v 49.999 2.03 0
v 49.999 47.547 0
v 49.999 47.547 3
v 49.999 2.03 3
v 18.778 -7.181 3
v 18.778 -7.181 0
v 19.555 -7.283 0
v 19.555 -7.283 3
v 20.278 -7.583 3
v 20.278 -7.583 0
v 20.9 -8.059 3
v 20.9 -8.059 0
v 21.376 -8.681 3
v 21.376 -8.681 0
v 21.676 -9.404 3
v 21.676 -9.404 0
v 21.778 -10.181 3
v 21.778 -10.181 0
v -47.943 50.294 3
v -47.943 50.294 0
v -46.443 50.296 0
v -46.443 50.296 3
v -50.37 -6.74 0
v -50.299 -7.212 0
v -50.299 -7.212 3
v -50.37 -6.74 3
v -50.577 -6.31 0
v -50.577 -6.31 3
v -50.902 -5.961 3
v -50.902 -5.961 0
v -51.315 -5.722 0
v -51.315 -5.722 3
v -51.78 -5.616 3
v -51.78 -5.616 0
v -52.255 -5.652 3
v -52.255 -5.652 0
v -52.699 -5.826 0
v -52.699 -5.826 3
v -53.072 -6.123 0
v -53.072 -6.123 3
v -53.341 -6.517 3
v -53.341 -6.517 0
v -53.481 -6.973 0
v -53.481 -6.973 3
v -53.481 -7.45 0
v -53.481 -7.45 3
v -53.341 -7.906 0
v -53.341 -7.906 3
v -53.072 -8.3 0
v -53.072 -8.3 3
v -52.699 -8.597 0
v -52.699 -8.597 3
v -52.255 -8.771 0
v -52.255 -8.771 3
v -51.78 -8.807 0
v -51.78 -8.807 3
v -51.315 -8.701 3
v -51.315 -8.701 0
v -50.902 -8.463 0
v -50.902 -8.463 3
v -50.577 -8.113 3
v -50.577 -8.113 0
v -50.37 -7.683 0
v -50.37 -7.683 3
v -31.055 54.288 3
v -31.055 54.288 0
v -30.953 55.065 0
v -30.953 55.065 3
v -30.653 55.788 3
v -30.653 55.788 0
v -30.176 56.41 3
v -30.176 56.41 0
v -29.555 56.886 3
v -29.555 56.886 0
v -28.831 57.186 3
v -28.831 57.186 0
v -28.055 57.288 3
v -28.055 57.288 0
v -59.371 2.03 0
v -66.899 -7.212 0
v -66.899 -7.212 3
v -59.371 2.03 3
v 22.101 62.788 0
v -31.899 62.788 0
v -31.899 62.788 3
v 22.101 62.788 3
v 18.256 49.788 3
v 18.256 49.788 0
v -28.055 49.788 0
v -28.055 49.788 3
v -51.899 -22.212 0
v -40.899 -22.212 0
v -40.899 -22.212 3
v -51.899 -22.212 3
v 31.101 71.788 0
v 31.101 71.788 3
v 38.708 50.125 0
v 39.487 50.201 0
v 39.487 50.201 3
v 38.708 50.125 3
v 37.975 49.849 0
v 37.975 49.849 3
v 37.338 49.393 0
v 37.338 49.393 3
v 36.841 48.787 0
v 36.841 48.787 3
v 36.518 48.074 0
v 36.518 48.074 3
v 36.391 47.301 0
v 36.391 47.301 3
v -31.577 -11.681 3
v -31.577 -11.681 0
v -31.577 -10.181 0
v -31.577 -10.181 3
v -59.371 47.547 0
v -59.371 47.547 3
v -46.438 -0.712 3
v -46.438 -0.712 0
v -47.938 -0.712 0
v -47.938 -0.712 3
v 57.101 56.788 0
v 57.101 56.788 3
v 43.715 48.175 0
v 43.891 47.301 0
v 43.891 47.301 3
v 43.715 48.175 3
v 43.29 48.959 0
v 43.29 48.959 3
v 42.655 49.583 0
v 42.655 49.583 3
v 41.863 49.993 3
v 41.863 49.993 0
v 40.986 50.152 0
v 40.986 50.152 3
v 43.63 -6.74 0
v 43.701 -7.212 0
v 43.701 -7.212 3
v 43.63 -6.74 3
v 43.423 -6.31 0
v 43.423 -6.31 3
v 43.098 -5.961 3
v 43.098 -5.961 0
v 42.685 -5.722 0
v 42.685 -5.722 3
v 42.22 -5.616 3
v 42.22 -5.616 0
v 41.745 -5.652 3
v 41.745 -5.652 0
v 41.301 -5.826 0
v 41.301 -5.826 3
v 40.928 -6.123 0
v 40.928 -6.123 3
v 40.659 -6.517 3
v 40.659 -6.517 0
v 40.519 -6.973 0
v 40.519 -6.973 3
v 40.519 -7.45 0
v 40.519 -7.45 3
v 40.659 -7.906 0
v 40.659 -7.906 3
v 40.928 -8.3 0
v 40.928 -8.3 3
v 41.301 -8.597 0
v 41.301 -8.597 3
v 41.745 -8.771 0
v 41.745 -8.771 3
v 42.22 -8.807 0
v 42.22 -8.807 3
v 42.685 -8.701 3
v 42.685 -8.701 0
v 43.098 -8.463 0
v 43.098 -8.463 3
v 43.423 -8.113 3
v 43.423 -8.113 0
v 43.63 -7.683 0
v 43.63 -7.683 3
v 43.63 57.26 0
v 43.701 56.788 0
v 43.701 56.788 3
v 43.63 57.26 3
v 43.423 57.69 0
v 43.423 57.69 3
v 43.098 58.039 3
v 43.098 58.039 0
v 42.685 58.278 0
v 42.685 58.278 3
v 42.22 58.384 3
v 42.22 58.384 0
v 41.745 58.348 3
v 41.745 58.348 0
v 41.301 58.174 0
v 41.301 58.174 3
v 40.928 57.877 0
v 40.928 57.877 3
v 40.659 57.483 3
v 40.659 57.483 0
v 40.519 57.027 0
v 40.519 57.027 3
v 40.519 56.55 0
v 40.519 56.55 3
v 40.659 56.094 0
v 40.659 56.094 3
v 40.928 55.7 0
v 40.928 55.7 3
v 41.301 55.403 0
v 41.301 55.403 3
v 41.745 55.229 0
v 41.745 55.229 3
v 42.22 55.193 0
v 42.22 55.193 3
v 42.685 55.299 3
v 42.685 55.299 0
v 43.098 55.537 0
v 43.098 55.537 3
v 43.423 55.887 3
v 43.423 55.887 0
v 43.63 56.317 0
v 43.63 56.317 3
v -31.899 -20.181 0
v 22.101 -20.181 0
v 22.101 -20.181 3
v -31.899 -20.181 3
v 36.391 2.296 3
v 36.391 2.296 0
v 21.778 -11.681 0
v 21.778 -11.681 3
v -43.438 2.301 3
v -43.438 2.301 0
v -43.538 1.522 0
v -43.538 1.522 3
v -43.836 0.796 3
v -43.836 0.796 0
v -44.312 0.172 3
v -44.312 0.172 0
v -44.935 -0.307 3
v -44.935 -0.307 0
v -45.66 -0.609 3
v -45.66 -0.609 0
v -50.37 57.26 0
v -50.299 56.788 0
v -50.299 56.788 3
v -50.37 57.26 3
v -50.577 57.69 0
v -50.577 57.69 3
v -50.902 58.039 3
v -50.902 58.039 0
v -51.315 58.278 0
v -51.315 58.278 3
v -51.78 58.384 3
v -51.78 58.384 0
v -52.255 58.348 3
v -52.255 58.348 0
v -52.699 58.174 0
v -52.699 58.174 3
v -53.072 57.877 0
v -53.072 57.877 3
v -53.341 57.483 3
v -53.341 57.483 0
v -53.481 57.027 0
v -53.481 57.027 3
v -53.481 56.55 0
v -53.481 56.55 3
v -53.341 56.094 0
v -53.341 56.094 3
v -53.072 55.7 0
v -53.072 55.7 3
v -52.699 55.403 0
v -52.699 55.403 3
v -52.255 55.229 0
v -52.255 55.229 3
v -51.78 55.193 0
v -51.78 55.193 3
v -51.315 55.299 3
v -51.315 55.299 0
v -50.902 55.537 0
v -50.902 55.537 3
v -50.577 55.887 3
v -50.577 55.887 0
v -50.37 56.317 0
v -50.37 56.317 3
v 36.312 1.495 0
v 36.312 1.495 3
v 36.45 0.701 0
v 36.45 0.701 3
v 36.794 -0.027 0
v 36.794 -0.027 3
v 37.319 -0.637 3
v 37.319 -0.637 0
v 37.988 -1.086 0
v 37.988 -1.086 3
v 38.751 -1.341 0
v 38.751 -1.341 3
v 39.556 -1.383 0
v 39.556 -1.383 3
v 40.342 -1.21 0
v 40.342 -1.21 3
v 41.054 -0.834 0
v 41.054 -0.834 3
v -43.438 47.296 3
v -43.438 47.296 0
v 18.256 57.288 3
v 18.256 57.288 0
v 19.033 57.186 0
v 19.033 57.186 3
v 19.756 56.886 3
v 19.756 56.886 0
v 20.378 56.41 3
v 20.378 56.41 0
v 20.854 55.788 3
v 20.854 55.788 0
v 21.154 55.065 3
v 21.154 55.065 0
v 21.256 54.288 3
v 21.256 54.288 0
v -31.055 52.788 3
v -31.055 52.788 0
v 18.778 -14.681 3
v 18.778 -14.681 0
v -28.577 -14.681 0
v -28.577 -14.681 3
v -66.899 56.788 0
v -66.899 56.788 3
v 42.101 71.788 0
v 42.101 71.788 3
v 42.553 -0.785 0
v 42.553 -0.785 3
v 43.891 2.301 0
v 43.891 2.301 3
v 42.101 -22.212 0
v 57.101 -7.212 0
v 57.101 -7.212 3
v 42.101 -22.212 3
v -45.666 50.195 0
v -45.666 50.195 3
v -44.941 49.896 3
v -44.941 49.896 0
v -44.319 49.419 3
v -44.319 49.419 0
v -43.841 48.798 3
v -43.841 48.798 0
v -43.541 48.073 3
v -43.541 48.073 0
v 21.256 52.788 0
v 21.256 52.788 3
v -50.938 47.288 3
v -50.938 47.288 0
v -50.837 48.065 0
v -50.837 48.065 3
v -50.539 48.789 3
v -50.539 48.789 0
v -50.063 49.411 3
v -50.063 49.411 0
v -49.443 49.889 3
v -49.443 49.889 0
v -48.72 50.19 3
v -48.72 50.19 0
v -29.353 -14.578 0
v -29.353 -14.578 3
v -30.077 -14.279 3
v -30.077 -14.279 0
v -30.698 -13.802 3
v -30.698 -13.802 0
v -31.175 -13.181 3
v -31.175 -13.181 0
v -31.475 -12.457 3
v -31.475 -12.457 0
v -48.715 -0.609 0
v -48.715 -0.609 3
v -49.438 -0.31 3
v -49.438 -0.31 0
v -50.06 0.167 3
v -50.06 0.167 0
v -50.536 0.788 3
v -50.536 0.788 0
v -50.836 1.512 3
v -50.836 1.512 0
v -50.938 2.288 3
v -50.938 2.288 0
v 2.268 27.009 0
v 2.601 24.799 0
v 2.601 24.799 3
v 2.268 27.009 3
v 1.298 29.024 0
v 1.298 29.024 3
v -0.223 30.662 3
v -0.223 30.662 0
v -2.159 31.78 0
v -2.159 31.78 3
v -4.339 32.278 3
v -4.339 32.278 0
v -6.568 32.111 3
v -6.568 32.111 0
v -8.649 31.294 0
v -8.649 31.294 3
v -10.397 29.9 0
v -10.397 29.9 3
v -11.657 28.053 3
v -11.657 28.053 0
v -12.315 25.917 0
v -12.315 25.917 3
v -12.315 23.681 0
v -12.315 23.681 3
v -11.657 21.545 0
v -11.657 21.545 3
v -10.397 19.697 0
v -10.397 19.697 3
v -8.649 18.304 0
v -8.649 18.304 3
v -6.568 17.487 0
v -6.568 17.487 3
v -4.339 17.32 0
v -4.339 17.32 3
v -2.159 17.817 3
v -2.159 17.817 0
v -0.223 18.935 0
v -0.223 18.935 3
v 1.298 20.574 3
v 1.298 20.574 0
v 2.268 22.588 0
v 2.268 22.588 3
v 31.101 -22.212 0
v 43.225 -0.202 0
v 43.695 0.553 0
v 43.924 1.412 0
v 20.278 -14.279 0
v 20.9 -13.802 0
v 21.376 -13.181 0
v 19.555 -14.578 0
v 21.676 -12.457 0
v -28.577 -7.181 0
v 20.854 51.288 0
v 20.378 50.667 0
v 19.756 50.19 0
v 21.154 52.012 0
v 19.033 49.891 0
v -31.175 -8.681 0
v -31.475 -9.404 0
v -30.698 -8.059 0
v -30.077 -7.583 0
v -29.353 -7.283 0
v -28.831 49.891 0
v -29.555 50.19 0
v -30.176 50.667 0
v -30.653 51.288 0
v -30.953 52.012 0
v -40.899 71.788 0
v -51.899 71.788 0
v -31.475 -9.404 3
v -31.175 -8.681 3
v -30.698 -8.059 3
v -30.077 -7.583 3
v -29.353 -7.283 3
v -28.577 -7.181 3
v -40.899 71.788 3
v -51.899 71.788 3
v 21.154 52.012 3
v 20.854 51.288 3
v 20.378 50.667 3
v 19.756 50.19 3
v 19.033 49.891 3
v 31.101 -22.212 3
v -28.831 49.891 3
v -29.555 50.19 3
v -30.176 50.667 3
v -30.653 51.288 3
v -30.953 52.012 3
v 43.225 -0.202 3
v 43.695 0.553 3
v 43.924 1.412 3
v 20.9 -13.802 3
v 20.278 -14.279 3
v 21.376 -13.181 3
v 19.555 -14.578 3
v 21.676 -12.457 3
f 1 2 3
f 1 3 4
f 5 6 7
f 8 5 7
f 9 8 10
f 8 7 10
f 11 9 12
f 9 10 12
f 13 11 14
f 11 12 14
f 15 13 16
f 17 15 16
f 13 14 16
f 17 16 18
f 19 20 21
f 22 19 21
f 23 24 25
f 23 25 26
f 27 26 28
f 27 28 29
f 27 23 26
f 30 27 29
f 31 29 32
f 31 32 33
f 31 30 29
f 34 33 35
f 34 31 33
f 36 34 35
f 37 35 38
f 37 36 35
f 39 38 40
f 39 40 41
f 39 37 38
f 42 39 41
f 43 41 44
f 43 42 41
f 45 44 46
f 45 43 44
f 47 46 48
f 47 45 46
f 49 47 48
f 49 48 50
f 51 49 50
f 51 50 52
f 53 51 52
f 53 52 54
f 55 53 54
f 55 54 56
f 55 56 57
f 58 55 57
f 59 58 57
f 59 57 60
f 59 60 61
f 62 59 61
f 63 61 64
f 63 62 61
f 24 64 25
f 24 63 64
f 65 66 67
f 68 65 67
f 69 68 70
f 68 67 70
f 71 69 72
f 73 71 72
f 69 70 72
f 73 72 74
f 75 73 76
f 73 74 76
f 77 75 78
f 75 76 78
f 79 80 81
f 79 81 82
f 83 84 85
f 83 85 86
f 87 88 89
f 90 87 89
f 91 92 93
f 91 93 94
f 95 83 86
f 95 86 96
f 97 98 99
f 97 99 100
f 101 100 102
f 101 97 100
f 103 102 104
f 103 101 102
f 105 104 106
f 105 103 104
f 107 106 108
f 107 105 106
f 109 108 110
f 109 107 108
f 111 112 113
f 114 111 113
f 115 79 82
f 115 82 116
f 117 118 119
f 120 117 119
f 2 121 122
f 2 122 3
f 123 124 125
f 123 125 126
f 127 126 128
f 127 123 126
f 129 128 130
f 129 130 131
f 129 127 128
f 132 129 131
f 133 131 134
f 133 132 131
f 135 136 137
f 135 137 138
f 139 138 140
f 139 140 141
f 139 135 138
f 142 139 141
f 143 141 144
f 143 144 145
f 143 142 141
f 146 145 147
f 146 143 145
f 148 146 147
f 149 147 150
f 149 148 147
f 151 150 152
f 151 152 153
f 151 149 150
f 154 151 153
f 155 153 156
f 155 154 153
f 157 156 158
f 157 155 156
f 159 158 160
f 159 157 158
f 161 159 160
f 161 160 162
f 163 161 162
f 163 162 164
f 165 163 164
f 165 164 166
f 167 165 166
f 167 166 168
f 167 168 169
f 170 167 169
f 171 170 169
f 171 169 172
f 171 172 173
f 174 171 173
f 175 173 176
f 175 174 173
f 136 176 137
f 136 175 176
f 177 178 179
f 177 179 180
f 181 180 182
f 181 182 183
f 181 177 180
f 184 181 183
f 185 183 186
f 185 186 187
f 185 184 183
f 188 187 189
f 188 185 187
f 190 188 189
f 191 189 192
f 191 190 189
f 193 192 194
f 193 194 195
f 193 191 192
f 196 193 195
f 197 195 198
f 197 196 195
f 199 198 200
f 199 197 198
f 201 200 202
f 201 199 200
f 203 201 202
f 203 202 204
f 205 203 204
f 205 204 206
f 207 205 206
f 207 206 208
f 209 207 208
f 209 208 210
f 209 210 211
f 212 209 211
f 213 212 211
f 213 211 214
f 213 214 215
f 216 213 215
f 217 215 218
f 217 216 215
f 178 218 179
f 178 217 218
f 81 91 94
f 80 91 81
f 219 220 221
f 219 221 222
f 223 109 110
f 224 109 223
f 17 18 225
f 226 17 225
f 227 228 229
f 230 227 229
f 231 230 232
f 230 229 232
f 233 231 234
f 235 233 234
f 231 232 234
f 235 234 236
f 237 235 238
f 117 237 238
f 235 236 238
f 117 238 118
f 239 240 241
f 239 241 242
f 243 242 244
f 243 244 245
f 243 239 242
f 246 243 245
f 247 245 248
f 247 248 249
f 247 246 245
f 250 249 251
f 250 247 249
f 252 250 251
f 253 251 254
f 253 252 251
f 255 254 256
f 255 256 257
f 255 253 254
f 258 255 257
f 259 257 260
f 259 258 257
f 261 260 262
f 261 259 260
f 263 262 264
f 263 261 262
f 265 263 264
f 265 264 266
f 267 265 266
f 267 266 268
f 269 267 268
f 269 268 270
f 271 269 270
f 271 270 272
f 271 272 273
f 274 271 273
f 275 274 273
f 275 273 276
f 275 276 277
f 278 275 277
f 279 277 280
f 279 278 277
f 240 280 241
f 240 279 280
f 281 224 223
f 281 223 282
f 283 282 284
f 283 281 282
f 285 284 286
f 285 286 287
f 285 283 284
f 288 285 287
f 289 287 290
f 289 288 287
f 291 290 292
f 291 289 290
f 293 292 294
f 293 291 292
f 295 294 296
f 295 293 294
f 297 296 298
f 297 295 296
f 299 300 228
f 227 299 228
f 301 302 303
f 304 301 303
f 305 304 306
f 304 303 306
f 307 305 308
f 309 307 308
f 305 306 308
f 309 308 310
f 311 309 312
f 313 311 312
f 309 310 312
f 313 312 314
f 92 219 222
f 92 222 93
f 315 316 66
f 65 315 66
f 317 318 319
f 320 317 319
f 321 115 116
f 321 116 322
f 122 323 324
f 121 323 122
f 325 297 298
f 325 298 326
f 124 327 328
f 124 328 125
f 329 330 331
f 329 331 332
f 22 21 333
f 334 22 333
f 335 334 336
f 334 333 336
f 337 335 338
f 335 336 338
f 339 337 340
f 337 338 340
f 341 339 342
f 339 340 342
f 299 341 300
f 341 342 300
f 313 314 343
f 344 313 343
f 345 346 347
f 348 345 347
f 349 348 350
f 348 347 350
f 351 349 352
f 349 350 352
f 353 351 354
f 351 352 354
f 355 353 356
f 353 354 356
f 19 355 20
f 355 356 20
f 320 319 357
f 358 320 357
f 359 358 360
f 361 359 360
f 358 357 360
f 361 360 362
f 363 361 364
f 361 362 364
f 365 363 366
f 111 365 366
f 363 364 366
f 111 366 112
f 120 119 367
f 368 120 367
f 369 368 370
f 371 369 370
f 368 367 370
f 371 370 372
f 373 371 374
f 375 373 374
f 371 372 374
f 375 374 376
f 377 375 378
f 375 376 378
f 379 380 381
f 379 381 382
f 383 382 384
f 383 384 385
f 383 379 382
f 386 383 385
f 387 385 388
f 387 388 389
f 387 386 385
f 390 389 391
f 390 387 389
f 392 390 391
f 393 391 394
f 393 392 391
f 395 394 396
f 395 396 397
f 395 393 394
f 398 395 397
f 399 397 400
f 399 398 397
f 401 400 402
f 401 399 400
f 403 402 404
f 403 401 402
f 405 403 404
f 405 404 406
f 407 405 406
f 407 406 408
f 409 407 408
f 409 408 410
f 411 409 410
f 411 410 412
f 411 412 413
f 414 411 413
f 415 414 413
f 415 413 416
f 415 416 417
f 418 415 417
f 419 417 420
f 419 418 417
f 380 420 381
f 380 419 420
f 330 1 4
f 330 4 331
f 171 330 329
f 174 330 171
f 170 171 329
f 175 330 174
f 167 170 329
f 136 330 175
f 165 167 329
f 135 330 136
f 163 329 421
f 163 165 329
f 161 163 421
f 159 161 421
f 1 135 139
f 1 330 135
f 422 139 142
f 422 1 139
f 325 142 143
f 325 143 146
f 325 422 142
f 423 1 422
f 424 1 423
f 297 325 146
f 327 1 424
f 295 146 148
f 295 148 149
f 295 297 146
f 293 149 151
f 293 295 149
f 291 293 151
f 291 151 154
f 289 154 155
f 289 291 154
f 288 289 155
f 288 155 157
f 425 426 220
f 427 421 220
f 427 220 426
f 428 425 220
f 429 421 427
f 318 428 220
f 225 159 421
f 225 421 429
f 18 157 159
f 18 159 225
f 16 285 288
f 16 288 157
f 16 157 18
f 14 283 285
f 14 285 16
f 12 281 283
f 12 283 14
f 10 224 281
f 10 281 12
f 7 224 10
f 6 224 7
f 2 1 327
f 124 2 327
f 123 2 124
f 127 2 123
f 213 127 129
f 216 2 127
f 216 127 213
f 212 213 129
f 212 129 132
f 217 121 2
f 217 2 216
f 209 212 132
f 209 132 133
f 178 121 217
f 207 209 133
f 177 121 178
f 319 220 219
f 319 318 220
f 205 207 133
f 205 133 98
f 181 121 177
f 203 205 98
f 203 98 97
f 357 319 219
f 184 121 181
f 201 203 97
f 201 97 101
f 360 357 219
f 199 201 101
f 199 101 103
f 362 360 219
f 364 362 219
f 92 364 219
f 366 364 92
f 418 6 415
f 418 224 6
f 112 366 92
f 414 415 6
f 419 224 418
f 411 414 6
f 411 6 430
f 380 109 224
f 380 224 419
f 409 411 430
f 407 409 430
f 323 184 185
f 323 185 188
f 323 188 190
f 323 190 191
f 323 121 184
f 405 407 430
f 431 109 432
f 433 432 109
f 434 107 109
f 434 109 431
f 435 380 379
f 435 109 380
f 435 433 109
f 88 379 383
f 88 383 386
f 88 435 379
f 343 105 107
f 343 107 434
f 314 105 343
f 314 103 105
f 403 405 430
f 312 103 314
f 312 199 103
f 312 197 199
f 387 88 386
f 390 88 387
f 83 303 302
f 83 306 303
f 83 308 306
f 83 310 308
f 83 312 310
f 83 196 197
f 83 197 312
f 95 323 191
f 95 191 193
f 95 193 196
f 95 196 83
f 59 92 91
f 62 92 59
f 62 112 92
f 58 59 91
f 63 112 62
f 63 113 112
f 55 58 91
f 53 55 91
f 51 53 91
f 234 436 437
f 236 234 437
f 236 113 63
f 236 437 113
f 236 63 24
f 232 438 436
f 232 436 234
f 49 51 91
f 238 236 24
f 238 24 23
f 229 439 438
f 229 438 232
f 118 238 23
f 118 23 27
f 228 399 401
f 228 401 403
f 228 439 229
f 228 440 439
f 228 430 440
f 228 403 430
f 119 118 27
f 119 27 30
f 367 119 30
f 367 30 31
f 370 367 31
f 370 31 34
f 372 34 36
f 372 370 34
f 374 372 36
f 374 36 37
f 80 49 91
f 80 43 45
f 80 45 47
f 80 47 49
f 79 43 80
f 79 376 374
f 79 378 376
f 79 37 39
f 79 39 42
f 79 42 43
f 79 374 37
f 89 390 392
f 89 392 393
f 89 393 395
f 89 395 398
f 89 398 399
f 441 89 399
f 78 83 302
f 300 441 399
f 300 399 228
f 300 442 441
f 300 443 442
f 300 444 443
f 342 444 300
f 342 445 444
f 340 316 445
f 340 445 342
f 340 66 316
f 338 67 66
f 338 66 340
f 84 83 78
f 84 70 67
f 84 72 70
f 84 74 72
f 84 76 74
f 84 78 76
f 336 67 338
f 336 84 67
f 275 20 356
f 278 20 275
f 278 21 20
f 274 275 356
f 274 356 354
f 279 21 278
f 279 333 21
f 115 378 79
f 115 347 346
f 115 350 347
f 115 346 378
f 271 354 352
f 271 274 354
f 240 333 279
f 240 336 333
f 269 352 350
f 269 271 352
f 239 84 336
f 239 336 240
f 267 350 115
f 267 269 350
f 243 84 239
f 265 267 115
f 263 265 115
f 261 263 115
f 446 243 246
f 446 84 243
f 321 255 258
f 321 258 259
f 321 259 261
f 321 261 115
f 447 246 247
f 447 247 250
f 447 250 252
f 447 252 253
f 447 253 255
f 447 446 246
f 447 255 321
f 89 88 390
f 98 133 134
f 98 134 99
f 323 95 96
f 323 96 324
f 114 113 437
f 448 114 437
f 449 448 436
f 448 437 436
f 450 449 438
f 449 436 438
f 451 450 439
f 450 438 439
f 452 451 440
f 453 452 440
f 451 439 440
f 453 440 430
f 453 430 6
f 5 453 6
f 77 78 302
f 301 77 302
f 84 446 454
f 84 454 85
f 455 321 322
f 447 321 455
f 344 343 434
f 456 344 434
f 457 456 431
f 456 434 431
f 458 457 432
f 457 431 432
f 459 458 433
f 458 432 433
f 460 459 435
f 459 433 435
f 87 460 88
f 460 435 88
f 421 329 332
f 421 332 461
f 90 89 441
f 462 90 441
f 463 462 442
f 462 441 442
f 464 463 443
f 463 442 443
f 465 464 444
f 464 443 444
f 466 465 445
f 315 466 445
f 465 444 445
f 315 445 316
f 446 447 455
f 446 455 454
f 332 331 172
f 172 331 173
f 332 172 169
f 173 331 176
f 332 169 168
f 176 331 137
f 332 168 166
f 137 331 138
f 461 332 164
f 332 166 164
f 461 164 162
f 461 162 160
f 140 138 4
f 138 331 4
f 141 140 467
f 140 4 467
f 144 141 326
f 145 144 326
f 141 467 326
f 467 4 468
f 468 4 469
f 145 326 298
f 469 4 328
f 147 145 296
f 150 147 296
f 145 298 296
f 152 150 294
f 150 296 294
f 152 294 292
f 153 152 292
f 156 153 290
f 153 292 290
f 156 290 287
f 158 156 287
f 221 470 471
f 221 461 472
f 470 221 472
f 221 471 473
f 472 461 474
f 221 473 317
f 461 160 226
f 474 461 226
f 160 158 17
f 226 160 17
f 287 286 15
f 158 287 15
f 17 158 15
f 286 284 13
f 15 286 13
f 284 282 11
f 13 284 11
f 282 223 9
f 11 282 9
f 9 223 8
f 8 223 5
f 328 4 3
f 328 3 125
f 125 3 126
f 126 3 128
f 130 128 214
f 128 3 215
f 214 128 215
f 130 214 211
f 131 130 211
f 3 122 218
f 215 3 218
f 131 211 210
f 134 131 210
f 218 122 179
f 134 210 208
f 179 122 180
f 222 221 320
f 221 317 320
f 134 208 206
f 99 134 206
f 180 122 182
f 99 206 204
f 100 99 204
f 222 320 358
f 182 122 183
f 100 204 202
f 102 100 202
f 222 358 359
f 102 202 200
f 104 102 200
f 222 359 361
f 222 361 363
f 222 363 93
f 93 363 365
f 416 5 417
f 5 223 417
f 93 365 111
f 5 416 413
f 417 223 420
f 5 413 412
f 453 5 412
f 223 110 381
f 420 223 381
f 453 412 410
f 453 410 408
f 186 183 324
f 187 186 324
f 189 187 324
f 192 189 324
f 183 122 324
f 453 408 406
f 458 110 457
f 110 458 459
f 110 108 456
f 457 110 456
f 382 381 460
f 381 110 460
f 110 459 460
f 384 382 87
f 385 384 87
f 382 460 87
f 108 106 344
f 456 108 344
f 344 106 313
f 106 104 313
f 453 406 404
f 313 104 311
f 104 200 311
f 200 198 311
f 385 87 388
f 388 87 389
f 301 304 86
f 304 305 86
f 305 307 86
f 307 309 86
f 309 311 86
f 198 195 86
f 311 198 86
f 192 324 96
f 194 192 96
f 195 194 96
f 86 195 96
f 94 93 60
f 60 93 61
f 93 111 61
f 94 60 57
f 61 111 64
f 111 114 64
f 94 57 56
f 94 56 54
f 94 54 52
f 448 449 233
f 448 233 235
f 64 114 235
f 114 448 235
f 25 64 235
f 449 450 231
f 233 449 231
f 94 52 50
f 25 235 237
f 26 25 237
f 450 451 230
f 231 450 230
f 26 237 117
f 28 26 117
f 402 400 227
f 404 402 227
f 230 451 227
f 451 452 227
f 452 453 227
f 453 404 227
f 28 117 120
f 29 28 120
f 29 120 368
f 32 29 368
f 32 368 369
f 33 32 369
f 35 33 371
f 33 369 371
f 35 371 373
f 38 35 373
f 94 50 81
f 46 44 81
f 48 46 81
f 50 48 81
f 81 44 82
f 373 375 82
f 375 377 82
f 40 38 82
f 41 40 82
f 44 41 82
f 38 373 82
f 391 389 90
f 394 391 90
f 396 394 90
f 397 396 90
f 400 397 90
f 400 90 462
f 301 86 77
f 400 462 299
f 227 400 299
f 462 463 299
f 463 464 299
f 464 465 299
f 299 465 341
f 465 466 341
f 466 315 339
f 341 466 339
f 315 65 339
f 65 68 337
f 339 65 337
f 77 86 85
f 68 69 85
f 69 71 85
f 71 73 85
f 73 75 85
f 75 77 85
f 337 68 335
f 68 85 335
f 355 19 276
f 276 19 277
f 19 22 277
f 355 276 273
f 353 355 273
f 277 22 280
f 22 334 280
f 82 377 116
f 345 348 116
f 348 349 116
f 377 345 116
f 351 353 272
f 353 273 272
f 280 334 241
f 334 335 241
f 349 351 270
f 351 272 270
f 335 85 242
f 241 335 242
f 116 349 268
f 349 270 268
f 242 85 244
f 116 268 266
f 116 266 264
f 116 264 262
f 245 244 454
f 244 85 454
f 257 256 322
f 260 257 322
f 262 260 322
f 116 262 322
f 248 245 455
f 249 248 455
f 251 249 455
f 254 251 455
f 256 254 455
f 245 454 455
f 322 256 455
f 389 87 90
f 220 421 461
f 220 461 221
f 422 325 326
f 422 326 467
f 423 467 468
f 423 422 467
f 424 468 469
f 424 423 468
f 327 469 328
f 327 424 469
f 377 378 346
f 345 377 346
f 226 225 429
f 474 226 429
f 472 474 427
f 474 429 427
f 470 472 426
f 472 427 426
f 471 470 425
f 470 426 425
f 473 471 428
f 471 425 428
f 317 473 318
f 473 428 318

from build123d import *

# Parameters (mm, degrees)
SKETCH1_R           = 7.50000053
SKETCH1_R_2         = 1.6
BOSS_EXTRUDE1_DEPTH = 3


with BuildPart() as part:
    # Sketch1 → Boss-Extrude1 (new body)
    with BuildSketch(Plane.XY):
        Polygon((-66.89924788, 56.788402458), (-51.89924788, 71.788403422), (-40.89924788, 71.788403422), (-31.89924788, 62.788403422), (22.10075212, 62.788403422), (31.10075212, 71.788403422), (42.10075212, 71.788403422), (57.10075212, 56.788402458), (49.999134038, 47.546675265), (49.999134038, 2.030197685), (57.10075212, -7.211596578), (42.10075212, -22.211596578), (31.10075212, -22.211596578), (22.10075212, -20.180597469), (-31.89924788, -20.180597469), (-40.89924788, -22.211598699), (-51.89924788, -22.211598699), (-66.89924788, -7.211596578), (-59.371431864, 2.030197685), (-59.371431864, 47.546675265), align=None)
        with Locations((-4.89924788, 24.798725856)):
            Circle(SKETCH1_R, mode=Mode.SUBTRACT)
        with Locations((-51.89924788, 56.788403422)):
            Circle(SKETCH1_R_2, mode=Mode.SUBTRACT)
        with Locations((42.10075212, 56.788403422)):
            Circle(SKETCH1_R_2, mode=Mode.SUBTRACT)
        with Locations((42.10075212, -7.211596578)):
            Circle(SKETCH1_R_2, mode=Mode.SUBTRACT)
        with Locations((-51.89924788, -7.211596578)):
            Circle(SKETCH1_R_2, mode=Mode.SUBTRACT)
        with BuildLine():
            Line((-47.943404379, 50.293594248), (-46.443406464, 50.296157806))
            ThreePointArc((-46.443406464, 50.296157806), (-44.318775436, 49.419295137), (-43.438283518, 47.296165805))
            Line((-43.438283518, 47.296165805), (-43.438283518, 2.301285908))
            ThreePointArc((-43.438283518, 2.301285908), (-44.312414708, 0.171678429), (-46.438272777, -0.711532092))
            Line((-46.438272777, -0.711532092), (-47.938272883, -0.711532092))
            ThreePointArc((-47.938272883, -0.711532092), (-50.059593376, 0.167147627), (-50.938273095, 2.28846812))
            Line((-50.938273095, 2.28846812), (-50.938273095, 47.288471302))
            ThreePointArc((-50.938273095, 47.288471302), (-50.063220077, 49.411290395), (-47.943404379, 50.293594248))
        make_face(mode=Mode.SUBTRACT)
        with BuildLine():
            Line((-28.054738716, 57.288403953), (18.256242957, 57.288403953))
            ThreePointArc((18.256242957, 57.288403953), (20.377563451, 56.409724234), (21.256243169, 54.28840374))
            Line((21.256243169, 54.28840374), (21.256243169, 52.788403634))
            ThreePointArc((21.256243169, 52.788403634), (20.377563451, 50.667083141), (18.256242957, 49.788403422))
            Line((18.256242957, 49.788403422), (-28.054738716, 49.788403422))
            ThreePointArc((-28.054738716, 49.788403422), (-30.17605921, 50.667083141), (-31.054738929, 52.788403634))
            Line((-31.054738929, 52.788403634), (-31.054738929, 54.28840374))
            ThreePointArc((-31.054738929, 54.28840374), (-30.17605921, 56.409724234), (-28.054738716, 57.288403953))
        make_face(mode=Mode.SUBTRACT)
        with BuildLine():
            Line((40.986432116, 50.152198784), (39.487237783, 50.201358441))
            ThreePointArc((39.487237783, 50.201358441), (37.338259765, 49.392672987), (36.390529804, 47.30128909))
            Line((36.390529804, 47.30128909), (36.390529804, 2.296162622))
            ThreePointArc((36.390529804, 2.296162622), (37.63815416, -0.88414715), (41.054067708, -0.834433807))
            Line((41.054067708, -0.834433807), (42.553262041, -0.78527415))
            ThreePointArc((42.553262041, -0.78527415), (43.695191197, 0.55294834), (43.890530335, 2.301285908))
            Line((43.890530335, 2.301285908), (43.890530335, 47.30128909))
            ThreePointArc((43.890530335, 47.30128909), (42.995792019, 49.294452303), (40.986432116, 50.152198784))
        make_face(mode=Mode.SUBTRACT)
        with BuildLine():
            Line((18.778253795, -14.680597999), (-28.576749554, -14.680597999))
            ThreePointArc((-28.576749554, -14.680597999), (-30.698070048, -13.801918281), (-31.576749766, -11.680597787))
            Line((-31.576749766, -11.680597787), (-31.576749766, -10.180597681))
            ThreePointArc((-31.576749766, -10.180597681), (-30.698070048, -8.059277188), (-28.576749554, -7.180597469))
            Line((-28.576749554, -7.180597469), (18.778253795, -7.180597469))
            ThreePointArc((18.778253795, -7.180597469), (20.899574288, -8.059277188), (21.778254007, -10.180597681))
            Line((21.778254007, -10.180597681), (21.778254007, -11.680597787))
            ThreePointArc((21.778254007, -11.680597787), (20.899574288, -13.801918281), (18.778253795, -14.680597999))
        make_face(mode=Mode.SUBTRACT)
    extrude(amount=BOSS_EXTRUDE1_DEPTH)


solid = part.part
